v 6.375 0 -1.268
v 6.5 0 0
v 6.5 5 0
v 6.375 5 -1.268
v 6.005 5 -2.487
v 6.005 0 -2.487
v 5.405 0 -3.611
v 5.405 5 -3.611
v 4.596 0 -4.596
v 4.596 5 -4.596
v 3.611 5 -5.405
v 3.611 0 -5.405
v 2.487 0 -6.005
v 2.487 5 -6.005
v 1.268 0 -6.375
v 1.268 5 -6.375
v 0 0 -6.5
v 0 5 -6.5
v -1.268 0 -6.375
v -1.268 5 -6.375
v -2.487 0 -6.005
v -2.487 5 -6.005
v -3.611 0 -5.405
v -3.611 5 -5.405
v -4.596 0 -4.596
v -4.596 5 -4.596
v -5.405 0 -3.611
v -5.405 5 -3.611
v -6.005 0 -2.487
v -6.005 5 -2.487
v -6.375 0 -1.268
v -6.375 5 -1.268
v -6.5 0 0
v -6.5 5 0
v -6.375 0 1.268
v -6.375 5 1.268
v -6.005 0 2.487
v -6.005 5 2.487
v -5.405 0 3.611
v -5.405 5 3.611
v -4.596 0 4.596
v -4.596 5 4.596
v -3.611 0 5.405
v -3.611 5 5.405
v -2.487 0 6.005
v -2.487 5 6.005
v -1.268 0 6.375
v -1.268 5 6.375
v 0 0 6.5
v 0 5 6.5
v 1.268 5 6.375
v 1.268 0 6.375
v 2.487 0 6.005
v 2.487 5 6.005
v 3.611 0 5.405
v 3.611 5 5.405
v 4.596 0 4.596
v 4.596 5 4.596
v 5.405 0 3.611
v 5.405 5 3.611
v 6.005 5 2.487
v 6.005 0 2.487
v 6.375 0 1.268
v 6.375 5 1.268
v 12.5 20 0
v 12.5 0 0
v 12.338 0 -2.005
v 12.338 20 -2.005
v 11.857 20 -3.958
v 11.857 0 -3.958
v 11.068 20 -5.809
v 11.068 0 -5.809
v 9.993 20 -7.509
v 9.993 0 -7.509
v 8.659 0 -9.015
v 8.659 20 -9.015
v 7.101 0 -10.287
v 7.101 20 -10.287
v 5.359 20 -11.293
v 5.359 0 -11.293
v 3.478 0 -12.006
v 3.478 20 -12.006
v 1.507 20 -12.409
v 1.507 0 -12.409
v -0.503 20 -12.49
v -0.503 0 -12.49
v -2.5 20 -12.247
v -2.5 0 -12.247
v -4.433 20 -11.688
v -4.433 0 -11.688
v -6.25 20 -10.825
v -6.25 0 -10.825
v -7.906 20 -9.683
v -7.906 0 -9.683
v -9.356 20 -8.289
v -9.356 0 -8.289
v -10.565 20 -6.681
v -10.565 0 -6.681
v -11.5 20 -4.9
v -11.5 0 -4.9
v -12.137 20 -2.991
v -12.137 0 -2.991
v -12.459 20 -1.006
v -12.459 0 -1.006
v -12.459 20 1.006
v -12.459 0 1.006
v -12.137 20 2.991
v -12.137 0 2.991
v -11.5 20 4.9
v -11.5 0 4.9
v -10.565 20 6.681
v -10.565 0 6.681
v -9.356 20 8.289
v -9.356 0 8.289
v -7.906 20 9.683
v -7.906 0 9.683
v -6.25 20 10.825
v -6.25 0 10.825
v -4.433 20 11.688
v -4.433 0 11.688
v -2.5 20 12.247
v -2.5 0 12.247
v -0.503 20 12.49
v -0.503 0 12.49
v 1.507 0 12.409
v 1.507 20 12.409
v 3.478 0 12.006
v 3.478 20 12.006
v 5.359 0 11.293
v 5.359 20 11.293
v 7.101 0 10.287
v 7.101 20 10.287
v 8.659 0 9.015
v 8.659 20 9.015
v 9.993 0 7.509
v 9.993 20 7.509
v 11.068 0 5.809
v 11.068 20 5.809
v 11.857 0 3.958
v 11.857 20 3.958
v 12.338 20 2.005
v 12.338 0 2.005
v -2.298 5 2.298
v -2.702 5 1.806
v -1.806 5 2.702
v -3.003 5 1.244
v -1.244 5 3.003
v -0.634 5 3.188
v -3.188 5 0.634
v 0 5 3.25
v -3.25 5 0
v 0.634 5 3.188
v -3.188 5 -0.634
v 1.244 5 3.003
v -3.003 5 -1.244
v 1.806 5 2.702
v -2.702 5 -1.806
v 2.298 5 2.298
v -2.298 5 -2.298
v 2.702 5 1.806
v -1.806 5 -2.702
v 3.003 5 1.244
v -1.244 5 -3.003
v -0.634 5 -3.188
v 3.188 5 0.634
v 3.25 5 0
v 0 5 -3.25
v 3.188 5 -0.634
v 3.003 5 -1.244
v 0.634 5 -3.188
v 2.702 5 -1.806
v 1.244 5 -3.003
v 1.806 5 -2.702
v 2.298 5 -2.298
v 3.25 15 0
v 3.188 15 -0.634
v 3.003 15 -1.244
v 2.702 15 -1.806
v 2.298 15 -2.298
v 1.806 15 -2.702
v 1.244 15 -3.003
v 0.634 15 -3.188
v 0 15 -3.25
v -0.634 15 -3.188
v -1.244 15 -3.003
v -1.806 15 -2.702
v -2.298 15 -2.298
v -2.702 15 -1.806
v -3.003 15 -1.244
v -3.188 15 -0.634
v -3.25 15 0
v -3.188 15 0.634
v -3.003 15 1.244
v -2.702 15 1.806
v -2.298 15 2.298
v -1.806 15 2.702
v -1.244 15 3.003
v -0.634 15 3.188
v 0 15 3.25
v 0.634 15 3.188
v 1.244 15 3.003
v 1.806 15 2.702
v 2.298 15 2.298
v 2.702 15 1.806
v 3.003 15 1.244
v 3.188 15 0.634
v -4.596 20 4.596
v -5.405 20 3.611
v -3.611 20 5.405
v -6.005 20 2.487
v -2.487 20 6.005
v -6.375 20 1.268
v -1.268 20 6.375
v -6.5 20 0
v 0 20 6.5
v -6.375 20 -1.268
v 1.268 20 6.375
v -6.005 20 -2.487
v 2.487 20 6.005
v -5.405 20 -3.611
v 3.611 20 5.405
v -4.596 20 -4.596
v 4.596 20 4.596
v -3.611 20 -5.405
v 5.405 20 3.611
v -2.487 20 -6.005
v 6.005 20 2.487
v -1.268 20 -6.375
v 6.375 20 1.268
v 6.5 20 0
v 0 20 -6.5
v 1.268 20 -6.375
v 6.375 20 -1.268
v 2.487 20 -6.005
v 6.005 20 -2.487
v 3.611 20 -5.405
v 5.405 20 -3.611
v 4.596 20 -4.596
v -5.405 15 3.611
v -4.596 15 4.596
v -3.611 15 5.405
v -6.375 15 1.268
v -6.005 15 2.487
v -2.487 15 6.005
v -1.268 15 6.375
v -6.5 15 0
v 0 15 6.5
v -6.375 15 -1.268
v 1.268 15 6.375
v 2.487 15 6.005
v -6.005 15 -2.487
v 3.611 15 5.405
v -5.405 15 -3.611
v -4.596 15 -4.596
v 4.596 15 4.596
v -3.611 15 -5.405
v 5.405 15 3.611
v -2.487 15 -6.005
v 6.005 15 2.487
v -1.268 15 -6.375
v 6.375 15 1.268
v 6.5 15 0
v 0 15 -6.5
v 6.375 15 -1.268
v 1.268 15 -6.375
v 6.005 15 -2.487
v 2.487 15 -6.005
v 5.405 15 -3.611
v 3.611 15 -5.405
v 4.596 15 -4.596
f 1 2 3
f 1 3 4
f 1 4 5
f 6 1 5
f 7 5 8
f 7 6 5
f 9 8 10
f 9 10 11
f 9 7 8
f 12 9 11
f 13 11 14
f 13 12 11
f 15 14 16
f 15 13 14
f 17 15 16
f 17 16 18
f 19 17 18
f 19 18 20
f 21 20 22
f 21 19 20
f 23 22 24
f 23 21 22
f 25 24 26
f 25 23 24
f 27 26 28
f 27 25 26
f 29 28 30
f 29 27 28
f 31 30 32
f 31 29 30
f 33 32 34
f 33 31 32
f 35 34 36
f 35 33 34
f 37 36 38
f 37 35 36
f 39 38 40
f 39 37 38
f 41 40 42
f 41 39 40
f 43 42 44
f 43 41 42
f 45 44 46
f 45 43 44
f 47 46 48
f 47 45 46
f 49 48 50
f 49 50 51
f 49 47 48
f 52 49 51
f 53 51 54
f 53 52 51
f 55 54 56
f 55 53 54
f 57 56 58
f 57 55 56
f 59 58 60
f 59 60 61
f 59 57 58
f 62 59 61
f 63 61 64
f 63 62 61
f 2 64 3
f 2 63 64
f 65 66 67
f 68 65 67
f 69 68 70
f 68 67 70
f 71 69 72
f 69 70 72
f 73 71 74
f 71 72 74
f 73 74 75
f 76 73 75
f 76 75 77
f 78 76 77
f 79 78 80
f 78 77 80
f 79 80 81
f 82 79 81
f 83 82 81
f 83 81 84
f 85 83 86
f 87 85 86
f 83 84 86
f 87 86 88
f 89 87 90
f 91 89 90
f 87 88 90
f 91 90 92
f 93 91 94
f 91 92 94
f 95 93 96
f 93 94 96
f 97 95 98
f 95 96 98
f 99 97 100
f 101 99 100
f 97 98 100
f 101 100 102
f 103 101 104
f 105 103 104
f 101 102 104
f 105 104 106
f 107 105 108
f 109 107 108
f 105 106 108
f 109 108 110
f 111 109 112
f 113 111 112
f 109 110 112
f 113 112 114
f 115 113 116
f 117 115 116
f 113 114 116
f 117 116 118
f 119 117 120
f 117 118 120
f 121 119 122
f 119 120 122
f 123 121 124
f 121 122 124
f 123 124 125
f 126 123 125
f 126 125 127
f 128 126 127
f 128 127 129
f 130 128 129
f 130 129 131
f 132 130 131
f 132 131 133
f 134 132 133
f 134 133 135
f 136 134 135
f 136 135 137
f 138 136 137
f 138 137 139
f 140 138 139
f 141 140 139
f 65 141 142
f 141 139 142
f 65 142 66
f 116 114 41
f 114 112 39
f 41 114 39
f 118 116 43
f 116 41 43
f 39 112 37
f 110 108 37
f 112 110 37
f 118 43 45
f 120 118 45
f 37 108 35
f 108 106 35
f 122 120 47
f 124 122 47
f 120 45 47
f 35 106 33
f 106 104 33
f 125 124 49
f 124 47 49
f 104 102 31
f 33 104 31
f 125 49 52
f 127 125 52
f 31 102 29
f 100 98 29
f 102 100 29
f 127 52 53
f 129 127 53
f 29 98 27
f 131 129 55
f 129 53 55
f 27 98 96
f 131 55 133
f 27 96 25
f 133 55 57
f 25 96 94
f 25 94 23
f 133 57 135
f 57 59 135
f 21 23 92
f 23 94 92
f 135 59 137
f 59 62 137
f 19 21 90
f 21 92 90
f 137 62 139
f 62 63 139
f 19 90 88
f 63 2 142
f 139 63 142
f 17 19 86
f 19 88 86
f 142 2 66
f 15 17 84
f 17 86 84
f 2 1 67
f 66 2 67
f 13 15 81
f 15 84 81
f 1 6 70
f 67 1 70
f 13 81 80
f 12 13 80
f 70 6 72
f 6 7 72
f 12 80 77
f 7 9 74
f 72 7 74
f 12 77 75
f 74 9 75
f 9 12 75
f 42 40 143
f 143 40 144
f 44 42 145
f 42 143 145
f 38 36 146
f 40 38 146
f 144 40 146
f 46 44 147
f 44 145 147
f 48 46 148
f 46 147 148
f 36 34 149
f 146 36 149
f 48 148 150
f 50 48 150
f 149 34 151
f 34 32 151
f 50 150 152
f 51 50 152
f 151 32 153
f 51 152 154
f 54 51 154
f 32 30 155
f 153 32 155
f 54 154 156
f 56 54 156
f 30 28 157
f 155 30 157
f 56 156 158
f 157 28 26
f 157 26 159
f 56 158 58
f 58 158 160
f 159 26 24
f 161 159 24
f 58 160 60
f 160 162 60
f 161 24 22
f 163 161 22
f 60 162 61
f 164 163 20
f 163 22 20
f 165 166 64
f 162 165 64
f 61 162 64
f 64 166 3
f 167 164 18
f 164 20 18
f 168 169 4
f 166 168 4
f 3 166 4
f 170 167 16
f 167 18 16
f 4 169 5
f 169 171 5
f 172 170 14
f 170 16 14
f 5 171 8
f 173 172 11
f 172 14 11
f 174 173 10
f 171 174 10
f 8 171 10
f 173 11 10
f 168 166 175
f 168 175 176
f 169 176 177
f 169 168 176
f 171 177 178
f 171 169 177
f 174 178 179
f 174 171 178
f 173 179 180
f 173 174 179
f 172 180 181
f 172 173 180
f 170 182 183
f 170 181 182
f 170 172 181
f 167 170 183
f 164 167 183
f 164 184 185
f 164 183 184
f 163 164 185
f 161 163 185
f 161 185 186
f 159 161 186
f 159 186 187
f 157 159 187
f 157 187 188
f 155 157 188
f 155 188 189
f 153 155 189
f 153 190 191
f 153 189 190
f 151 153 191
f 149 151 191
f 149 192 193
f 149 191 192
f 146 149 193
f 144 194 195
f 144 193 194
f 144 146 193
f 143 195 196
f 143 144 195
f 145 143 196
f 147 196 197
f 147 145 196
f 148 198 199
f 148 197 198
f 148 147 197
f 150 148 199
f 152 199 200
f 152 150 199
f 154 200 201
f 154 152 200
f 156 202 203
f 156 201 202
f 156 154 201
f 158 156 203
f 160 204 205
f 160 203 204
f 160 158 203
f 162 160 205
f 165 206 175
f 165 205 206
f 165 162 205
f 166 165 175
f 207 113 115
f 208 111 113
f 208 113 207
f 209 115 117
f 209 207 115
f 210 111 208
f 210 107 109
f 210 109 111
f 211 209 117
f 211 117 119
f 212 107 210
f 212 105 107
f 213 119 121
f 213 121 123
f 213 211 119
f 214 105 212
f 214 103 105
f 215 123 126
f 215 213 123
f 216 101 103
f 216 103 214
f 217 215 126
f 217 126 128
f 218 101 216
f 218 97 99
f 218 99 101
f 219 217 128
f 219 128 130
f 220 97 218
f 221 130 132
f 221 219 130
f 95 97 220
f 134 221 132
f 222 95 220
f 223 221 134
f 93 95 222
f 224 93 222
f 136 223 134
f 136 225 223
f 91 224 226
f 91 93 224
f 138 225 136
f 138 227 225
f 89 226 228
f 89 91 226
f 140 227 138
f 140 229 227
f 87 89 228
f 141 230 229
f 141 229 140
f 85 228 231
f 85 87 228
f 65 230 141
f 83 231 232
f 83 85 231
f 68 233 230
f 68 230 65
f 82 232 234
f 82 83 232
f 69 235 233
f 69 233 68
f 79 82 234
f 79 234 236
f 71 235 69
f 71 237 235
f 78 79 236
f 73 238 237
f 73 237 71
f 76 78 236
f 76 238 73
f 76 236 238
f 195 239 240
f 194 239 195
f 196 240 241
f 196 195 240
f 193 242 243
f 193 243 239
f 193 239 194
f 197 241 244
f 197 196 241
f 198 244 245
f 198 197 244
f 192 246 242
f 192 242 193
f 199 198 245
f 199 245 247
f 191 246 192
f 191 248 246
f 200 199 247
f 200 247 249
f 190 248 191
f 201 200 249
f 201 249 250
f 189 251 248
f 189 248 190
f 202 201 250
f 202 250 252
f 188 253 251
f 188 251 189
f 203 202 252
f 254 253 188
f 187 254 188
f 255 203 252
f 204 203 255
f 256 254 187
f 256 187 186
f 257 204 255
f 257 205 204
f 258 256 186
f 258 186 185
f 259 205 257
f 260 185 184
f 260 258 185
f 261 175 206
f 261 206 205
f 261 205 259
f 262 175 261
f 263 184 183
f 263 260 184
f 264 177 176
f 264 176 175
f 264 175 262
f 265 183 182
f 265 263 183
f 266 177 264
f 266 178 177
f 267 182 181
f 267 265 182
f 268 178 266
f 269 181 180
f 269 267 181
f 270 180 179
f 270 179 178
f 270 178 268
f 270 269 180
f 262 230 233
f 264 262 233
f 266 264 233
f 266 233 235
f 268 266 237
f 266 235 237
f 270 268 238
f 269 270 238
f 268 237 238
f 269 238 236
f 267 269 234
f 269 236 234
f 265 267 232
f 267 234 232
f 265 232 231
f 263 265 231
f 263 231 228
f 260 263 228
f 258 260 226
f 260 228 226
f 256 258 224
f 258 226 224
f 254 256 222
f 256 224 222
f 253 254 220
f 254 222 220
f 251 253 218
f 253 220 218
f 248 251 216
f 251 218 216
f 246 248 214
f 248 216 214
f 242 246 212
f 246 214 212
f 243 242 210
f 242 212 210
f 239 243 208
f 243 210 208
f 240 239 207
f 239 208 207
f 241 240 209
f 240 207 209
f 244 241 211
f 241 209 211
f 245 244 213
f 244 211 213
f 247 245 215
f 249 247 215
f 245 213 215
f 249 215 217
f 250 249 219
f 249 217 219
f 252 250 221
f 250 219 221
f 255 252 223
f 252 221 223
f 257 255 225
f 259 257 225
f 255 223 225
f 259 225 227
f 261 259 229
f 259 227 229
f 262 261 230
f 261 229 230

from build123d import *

# Parameters (mm, degrees)
SKETCH1_R           = 12.5
SKETCH1_R_2         = 3.25
BOSS_EXTRUDE1_DEPTH = 20
SKETCH2_R           = 6.5
CUT_EXTRUDE1_DEPTH  = 5
SKETCH3_R           = 6.5
CUT_EXTRUDE2_DEPTH  = 5


with BuildPart() as part:
    # Sketch1 → Boss-Extrude1 (new body)
    with BuildSketch(Plane(origin=(0, 0, 0), x_dir=(1, 0, 0), z_dir=(0, 1, 0))):
        Circle(SKETCH1_R)
        Circle(SKETCH1_R_2, mode=Mode.SUBTRACT)
    extrude(amount=BOSS_EXTRUDE1_DEPTH)

    # Sketch2 → Cut-Extrude1 (cut)
    with BuildSketch(Plane(origin=(0, 0, 0), x_dir=(1, 0, 0), z_dir=(0, 1, 0))):
        Circle(SKETCH2_R)
    extrude(amount=CUT_EXTRUDE1_DEPTH, mode=Mode.SUBTRACT)

    # Sketch3 → Cut-Extrude2 (cut)
    with BuildSketch(Plane(origin=(0, 20, 0), x_dir=(1, 0, 0), z_dir=(0, 1, 0))):
        Circle(SKETCH3_R)
    extrude(amount=-CUT_EXTRUDE2_DEPTH, mode=Mode.SUBTRACT)


solid = part.part
